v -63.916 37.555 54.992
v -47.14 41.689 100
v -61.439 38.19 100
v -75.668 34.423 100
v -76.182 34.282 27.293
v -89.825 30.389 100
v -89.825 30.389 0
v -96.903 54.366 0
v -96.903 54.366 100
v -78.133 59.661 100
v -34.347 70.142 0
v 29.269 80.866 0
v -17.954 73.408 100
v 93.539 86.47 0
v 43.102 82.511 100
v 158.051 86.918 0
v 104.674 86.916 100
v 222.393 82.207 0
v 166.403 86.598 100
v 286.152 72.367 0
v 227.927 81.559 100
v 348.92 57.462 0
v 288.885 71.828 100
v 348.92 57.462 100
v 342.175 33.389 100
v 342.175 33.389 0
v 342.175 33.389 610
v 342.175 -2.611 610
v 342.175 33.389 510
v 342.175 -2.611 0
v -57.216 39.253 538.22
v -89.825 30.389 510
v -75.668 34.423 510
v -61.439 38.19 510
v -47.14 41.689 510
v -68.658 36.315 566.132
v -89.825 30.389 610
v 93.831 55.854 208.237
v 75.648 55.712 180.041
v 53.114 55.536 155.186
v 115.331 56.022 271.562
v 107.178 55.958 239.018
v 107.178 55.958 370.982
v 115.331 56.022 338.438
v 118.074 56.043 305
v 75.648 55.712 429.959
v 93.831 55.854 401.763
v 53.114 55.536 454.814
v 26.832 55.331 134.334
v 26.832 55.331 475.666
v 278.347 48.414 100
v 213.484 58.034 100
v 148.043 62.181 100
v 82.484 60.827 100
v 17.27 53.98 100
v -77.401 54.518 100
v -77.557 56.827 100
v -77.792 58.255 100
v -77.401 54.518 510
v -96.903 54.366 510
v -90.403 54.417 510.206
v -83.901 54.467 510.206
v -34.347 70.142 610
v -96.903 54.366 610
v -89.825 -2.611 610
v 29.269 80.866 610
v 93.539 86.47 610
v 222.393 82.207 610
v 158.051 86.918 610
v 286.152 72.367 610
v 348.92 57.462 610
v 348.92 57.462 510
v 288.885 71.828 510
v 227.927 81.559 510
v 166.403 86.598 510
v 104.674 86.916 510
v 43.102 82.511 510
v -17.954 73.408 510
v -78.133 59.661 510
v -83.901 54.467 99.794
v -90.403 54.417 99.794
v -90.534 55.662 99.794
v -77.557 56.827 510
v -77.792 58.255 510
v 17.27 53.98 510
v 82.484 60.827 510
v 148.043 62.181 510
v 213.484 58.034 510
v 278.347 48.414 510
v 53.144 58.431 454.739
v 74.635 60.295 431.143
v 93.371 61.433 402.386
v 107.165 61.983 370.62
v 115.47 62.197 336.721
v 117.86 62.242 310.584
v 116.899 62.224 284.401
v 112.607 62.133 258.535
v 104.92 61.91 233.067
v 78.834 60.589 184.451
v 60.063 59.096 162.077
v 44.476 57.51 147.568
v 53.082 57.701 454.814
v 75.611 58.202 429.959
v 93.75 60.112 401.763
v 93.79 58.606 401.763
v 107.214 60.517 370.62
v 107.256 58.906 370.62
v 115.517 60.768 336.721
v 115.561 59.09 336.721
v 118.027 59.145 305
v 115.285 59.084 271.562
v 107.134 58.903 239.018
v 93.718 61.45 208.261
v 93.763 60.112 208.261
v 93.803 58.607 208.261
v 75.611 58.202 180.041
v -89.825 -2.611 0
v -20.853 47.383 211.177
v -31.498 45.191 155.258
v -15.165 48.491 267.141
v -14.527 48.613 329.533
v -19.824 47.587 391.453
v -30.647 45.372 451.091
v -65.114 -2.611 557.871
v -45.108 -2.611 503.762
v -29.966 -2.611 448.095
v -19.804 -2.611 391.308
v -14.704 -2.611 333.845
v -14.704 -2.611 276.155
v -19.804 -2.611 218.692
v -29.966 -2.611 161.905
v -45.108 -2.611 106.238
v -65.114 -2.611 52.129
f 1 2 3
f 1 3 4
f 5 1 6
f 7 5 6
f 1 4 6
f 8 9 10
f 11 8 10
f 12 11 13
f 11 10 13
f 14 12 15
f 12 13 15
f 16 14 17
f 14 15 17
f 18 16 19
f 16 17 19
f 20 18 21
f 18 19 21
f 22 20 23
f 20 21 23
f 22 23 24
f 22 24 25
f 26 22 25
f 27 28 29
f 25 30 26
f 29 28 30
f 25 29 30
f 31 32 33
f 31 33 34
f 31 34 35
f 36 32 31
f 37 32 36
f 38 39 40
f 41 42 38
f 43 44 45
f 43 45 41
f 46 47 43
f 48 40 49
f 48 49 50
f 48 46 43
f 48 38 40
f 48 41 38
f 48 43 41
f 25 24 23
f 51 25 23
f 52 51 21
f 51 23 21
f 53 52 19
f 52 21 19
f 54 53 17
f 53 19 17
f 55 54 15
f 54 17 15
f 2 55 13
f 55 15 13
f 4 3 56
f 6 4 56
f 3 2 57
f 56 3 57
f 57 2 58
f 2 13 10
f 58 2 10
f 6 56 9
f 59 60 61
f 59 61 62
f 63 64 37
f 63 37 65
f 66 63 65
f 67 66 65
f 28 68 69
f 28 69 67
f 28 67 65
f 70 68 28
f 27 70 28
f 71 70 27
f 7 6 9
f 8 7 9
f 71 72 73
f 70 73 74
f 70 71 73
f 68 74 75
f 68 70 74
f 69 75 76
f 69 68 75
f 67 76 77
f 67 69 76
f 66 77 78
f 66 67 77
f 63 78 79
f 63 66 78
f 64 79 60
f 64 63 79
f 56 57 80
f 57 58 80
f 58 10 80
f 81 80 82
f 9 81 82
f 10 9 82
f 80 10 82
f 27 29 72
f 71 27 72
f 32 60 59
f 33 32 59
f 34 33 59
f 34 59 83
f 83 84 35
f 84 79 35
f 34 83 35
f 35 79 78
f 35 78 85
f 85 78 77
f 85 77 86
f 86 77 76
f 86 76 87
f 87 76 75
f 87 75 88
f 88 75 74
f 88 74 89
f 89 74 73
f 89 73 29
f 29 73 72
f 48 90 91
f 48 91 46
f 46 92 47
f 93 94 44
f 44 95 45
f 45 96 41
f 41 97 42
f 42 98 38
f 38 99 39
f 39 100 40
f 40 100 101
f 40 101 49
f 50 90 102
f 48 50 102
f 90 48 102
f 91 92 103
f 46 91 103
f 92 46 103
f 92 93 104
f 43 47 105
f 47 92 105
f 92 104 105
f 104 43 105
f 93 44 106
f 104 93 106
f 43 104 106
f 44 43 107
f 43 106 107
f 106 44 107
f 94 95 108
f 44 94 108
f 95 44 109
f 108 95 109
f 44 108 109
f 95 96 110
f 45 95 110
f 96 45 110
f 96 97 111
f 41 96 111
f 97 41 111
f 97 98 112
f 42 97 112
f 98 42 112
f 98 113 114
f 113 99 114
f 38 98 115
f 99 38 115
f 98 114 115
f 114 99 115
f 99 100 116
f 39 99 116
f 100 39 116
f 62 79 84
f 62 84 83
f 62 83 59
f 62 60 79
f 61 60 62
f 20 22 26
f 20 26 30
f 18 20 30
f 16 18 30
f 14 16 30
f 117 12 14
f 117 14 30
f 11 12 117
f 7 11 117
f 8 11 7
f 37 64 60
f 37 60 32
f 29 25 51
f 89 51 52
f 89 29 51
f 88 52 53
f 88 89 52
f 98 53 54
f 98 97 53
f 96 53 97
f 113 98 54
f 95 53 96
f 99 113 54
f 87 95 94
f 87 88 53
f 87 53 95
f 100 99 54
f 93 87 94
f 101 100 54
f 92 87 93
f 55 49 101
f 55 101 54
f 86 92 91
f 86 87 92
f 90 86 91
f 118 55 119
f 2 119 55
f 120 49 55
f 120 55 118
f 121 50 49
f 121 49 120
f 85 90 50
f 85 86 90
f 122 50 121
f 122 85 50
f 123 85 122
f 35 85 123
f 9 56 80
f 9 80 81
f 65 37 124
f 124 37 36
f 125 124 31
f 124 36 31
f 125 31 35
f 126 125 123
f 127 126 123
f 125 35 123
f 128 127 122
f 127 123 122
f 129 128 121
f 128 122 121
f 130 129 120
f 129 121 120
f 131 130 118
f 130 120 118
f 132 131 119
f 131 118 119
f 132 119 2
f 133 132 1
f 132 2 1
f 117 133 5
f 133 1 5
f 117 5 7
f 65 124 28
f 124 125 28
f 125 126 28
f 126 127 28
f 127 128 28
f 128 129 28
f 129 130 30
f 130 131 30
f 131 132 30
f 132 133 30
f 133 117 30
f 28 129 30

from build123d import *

# Parameters (mm, degrees)
BOSS_EXTRUDE1_DEPTH = 610
CUT_EXTRUDE1_DEPTH  = 610
CUT_EXTRUDE2_DEPTH  = 703.283548499
BOSS_EXTRUDE2_DEPTH = 100
BOSS_EXTRUDE3_START = -100
BOSS_EXTRUDE3_DEPTH = 100
CUT_REVOLVE3_ANGLE  = 106


with BuildPart() as part:
    # Sketch1 → Boss-Extrude1 (new body)
    with BuildSketch(Plane.XY):
        Polygon((-89.824548177, 33.388821274), (-89.824548177, -2.611178726), (342.175451823, -2.611178726), (342.175451823, 33.388821274), (342.175451823, 63.388821274), (-89.824548177, 63.388821274), align=None)
    extrude(amount=BOSS_EXTRUDE1_DEPTH)

    # Sketch2 → Cut-Extrude1 (cut)
    with BuildSketch(Plane(origin=(0, 63.388821274, 0), x_dir=(1, 0, 0), z_dir=(0, 1, 0))):
        with BuildLine():
            Line((-89.824548177, 0), (-89.824548177, -610))
            ThreePointArc((-89.824548177, -610), (-14.065137005, -305), (-89.824548177, 0))
        make_face()
    extrude(amount=-CUT_EXTRUDE1_DEPTH, mode=Mode.SUBTRACT)

    # Sketch3 → Cut-Extrude2 (cut, through all)
    with BuildSketch(Plane.XY.offset(610)):
        with BuildLine():
            Line((-89.824548177, 30.388821274), (-89.824548177, 63.388821274))
            Line((-89.824548177, 63.388821274), (342.175451823, 63.388821274))
            Line((342.175451823, 63.388821274), (342.175451823, 33.388821274))
            ThreePointArc((342.175451823, 33.388821274), (125.963985264, 62.340005792), (-89.824548177, 30.388821274))
        make_face()
    extrude(amount=-CUT_EXTRUDE2_DEPTH, mode=Mode.SUBTRACT)

    # Sketch4 → Boss-Extrude2 (add)
    with BuildSketch(Plane.XY.offset(610)):
        with BuildLine():
            Line((-96.902742964, 54.365876109), (-89.824548177, 30.388821274))
            ThreePointArc((-89.824548177, 30.388821274), (125.963985264, 62.340005792), (342.175451823, 33.388821274))
            Line((342.175451823, 33.388821274), (348.919965355, 57.461867139))
            ThreePointArc((348.919965355, 57.461867139), (125.790378339, 87.339402998), (-96.902742964, 54.365876109))
        make_face()
    extrude(amount=-BOSS_EXTRUDE2_DEPTH)

    # Sketch5 → Boss-Extrude3 (add)
    with BuildSketch(Plane(origin=(0, 0, 0), x_dir=(-1, 0, 0), z_dir=(0, 0, -1)).offset(BOSS_EXTRUDE3_START)):
        with BuildLine():
            Line((-348.919965355, 57.461867139), (-342.175451823, 33.388821274))
            ThreePointArc((-342.175451823, 33.388821274), (-125.963985264, 62.340005792), (89.824548177, 30.388821274))
            Line((89.824548177, 30.388821274), (96.902742964, 54.365876109))
            ThreePointArc((96.902742964, 54.365876109), (-125.790378339, 87.339402998), (-348.919965355, 57.461867139))
        make_face()
    extrude(amount=BOSS_EXTRUDE3_DEPTH)

    # Sketch6 → Cut-Revolve3 (revolve, cut)
    with BuildSketch(Plane(origin=(-74.37222514, -21.955202584, 0), x_dir=(0, 0, 1), z_dir=(-0.9590821933998281, -0.2831277914712271, 0))):
        with BuildLine():
            Line((100, 79.577203308), (510, 79.577203308))
            ThreePointArc((510, 79.577203308), (305, 294.560025587), (100, 79.577203308))
        make_face()
    revolve(axis=Axis((-96.902742964, 54.365876109, 100), (0, 0, -1)), revolution_arc=CUT_REVOLVE3_ANGLE, mode=Mode.SUBTRACT)


solid = part.part
